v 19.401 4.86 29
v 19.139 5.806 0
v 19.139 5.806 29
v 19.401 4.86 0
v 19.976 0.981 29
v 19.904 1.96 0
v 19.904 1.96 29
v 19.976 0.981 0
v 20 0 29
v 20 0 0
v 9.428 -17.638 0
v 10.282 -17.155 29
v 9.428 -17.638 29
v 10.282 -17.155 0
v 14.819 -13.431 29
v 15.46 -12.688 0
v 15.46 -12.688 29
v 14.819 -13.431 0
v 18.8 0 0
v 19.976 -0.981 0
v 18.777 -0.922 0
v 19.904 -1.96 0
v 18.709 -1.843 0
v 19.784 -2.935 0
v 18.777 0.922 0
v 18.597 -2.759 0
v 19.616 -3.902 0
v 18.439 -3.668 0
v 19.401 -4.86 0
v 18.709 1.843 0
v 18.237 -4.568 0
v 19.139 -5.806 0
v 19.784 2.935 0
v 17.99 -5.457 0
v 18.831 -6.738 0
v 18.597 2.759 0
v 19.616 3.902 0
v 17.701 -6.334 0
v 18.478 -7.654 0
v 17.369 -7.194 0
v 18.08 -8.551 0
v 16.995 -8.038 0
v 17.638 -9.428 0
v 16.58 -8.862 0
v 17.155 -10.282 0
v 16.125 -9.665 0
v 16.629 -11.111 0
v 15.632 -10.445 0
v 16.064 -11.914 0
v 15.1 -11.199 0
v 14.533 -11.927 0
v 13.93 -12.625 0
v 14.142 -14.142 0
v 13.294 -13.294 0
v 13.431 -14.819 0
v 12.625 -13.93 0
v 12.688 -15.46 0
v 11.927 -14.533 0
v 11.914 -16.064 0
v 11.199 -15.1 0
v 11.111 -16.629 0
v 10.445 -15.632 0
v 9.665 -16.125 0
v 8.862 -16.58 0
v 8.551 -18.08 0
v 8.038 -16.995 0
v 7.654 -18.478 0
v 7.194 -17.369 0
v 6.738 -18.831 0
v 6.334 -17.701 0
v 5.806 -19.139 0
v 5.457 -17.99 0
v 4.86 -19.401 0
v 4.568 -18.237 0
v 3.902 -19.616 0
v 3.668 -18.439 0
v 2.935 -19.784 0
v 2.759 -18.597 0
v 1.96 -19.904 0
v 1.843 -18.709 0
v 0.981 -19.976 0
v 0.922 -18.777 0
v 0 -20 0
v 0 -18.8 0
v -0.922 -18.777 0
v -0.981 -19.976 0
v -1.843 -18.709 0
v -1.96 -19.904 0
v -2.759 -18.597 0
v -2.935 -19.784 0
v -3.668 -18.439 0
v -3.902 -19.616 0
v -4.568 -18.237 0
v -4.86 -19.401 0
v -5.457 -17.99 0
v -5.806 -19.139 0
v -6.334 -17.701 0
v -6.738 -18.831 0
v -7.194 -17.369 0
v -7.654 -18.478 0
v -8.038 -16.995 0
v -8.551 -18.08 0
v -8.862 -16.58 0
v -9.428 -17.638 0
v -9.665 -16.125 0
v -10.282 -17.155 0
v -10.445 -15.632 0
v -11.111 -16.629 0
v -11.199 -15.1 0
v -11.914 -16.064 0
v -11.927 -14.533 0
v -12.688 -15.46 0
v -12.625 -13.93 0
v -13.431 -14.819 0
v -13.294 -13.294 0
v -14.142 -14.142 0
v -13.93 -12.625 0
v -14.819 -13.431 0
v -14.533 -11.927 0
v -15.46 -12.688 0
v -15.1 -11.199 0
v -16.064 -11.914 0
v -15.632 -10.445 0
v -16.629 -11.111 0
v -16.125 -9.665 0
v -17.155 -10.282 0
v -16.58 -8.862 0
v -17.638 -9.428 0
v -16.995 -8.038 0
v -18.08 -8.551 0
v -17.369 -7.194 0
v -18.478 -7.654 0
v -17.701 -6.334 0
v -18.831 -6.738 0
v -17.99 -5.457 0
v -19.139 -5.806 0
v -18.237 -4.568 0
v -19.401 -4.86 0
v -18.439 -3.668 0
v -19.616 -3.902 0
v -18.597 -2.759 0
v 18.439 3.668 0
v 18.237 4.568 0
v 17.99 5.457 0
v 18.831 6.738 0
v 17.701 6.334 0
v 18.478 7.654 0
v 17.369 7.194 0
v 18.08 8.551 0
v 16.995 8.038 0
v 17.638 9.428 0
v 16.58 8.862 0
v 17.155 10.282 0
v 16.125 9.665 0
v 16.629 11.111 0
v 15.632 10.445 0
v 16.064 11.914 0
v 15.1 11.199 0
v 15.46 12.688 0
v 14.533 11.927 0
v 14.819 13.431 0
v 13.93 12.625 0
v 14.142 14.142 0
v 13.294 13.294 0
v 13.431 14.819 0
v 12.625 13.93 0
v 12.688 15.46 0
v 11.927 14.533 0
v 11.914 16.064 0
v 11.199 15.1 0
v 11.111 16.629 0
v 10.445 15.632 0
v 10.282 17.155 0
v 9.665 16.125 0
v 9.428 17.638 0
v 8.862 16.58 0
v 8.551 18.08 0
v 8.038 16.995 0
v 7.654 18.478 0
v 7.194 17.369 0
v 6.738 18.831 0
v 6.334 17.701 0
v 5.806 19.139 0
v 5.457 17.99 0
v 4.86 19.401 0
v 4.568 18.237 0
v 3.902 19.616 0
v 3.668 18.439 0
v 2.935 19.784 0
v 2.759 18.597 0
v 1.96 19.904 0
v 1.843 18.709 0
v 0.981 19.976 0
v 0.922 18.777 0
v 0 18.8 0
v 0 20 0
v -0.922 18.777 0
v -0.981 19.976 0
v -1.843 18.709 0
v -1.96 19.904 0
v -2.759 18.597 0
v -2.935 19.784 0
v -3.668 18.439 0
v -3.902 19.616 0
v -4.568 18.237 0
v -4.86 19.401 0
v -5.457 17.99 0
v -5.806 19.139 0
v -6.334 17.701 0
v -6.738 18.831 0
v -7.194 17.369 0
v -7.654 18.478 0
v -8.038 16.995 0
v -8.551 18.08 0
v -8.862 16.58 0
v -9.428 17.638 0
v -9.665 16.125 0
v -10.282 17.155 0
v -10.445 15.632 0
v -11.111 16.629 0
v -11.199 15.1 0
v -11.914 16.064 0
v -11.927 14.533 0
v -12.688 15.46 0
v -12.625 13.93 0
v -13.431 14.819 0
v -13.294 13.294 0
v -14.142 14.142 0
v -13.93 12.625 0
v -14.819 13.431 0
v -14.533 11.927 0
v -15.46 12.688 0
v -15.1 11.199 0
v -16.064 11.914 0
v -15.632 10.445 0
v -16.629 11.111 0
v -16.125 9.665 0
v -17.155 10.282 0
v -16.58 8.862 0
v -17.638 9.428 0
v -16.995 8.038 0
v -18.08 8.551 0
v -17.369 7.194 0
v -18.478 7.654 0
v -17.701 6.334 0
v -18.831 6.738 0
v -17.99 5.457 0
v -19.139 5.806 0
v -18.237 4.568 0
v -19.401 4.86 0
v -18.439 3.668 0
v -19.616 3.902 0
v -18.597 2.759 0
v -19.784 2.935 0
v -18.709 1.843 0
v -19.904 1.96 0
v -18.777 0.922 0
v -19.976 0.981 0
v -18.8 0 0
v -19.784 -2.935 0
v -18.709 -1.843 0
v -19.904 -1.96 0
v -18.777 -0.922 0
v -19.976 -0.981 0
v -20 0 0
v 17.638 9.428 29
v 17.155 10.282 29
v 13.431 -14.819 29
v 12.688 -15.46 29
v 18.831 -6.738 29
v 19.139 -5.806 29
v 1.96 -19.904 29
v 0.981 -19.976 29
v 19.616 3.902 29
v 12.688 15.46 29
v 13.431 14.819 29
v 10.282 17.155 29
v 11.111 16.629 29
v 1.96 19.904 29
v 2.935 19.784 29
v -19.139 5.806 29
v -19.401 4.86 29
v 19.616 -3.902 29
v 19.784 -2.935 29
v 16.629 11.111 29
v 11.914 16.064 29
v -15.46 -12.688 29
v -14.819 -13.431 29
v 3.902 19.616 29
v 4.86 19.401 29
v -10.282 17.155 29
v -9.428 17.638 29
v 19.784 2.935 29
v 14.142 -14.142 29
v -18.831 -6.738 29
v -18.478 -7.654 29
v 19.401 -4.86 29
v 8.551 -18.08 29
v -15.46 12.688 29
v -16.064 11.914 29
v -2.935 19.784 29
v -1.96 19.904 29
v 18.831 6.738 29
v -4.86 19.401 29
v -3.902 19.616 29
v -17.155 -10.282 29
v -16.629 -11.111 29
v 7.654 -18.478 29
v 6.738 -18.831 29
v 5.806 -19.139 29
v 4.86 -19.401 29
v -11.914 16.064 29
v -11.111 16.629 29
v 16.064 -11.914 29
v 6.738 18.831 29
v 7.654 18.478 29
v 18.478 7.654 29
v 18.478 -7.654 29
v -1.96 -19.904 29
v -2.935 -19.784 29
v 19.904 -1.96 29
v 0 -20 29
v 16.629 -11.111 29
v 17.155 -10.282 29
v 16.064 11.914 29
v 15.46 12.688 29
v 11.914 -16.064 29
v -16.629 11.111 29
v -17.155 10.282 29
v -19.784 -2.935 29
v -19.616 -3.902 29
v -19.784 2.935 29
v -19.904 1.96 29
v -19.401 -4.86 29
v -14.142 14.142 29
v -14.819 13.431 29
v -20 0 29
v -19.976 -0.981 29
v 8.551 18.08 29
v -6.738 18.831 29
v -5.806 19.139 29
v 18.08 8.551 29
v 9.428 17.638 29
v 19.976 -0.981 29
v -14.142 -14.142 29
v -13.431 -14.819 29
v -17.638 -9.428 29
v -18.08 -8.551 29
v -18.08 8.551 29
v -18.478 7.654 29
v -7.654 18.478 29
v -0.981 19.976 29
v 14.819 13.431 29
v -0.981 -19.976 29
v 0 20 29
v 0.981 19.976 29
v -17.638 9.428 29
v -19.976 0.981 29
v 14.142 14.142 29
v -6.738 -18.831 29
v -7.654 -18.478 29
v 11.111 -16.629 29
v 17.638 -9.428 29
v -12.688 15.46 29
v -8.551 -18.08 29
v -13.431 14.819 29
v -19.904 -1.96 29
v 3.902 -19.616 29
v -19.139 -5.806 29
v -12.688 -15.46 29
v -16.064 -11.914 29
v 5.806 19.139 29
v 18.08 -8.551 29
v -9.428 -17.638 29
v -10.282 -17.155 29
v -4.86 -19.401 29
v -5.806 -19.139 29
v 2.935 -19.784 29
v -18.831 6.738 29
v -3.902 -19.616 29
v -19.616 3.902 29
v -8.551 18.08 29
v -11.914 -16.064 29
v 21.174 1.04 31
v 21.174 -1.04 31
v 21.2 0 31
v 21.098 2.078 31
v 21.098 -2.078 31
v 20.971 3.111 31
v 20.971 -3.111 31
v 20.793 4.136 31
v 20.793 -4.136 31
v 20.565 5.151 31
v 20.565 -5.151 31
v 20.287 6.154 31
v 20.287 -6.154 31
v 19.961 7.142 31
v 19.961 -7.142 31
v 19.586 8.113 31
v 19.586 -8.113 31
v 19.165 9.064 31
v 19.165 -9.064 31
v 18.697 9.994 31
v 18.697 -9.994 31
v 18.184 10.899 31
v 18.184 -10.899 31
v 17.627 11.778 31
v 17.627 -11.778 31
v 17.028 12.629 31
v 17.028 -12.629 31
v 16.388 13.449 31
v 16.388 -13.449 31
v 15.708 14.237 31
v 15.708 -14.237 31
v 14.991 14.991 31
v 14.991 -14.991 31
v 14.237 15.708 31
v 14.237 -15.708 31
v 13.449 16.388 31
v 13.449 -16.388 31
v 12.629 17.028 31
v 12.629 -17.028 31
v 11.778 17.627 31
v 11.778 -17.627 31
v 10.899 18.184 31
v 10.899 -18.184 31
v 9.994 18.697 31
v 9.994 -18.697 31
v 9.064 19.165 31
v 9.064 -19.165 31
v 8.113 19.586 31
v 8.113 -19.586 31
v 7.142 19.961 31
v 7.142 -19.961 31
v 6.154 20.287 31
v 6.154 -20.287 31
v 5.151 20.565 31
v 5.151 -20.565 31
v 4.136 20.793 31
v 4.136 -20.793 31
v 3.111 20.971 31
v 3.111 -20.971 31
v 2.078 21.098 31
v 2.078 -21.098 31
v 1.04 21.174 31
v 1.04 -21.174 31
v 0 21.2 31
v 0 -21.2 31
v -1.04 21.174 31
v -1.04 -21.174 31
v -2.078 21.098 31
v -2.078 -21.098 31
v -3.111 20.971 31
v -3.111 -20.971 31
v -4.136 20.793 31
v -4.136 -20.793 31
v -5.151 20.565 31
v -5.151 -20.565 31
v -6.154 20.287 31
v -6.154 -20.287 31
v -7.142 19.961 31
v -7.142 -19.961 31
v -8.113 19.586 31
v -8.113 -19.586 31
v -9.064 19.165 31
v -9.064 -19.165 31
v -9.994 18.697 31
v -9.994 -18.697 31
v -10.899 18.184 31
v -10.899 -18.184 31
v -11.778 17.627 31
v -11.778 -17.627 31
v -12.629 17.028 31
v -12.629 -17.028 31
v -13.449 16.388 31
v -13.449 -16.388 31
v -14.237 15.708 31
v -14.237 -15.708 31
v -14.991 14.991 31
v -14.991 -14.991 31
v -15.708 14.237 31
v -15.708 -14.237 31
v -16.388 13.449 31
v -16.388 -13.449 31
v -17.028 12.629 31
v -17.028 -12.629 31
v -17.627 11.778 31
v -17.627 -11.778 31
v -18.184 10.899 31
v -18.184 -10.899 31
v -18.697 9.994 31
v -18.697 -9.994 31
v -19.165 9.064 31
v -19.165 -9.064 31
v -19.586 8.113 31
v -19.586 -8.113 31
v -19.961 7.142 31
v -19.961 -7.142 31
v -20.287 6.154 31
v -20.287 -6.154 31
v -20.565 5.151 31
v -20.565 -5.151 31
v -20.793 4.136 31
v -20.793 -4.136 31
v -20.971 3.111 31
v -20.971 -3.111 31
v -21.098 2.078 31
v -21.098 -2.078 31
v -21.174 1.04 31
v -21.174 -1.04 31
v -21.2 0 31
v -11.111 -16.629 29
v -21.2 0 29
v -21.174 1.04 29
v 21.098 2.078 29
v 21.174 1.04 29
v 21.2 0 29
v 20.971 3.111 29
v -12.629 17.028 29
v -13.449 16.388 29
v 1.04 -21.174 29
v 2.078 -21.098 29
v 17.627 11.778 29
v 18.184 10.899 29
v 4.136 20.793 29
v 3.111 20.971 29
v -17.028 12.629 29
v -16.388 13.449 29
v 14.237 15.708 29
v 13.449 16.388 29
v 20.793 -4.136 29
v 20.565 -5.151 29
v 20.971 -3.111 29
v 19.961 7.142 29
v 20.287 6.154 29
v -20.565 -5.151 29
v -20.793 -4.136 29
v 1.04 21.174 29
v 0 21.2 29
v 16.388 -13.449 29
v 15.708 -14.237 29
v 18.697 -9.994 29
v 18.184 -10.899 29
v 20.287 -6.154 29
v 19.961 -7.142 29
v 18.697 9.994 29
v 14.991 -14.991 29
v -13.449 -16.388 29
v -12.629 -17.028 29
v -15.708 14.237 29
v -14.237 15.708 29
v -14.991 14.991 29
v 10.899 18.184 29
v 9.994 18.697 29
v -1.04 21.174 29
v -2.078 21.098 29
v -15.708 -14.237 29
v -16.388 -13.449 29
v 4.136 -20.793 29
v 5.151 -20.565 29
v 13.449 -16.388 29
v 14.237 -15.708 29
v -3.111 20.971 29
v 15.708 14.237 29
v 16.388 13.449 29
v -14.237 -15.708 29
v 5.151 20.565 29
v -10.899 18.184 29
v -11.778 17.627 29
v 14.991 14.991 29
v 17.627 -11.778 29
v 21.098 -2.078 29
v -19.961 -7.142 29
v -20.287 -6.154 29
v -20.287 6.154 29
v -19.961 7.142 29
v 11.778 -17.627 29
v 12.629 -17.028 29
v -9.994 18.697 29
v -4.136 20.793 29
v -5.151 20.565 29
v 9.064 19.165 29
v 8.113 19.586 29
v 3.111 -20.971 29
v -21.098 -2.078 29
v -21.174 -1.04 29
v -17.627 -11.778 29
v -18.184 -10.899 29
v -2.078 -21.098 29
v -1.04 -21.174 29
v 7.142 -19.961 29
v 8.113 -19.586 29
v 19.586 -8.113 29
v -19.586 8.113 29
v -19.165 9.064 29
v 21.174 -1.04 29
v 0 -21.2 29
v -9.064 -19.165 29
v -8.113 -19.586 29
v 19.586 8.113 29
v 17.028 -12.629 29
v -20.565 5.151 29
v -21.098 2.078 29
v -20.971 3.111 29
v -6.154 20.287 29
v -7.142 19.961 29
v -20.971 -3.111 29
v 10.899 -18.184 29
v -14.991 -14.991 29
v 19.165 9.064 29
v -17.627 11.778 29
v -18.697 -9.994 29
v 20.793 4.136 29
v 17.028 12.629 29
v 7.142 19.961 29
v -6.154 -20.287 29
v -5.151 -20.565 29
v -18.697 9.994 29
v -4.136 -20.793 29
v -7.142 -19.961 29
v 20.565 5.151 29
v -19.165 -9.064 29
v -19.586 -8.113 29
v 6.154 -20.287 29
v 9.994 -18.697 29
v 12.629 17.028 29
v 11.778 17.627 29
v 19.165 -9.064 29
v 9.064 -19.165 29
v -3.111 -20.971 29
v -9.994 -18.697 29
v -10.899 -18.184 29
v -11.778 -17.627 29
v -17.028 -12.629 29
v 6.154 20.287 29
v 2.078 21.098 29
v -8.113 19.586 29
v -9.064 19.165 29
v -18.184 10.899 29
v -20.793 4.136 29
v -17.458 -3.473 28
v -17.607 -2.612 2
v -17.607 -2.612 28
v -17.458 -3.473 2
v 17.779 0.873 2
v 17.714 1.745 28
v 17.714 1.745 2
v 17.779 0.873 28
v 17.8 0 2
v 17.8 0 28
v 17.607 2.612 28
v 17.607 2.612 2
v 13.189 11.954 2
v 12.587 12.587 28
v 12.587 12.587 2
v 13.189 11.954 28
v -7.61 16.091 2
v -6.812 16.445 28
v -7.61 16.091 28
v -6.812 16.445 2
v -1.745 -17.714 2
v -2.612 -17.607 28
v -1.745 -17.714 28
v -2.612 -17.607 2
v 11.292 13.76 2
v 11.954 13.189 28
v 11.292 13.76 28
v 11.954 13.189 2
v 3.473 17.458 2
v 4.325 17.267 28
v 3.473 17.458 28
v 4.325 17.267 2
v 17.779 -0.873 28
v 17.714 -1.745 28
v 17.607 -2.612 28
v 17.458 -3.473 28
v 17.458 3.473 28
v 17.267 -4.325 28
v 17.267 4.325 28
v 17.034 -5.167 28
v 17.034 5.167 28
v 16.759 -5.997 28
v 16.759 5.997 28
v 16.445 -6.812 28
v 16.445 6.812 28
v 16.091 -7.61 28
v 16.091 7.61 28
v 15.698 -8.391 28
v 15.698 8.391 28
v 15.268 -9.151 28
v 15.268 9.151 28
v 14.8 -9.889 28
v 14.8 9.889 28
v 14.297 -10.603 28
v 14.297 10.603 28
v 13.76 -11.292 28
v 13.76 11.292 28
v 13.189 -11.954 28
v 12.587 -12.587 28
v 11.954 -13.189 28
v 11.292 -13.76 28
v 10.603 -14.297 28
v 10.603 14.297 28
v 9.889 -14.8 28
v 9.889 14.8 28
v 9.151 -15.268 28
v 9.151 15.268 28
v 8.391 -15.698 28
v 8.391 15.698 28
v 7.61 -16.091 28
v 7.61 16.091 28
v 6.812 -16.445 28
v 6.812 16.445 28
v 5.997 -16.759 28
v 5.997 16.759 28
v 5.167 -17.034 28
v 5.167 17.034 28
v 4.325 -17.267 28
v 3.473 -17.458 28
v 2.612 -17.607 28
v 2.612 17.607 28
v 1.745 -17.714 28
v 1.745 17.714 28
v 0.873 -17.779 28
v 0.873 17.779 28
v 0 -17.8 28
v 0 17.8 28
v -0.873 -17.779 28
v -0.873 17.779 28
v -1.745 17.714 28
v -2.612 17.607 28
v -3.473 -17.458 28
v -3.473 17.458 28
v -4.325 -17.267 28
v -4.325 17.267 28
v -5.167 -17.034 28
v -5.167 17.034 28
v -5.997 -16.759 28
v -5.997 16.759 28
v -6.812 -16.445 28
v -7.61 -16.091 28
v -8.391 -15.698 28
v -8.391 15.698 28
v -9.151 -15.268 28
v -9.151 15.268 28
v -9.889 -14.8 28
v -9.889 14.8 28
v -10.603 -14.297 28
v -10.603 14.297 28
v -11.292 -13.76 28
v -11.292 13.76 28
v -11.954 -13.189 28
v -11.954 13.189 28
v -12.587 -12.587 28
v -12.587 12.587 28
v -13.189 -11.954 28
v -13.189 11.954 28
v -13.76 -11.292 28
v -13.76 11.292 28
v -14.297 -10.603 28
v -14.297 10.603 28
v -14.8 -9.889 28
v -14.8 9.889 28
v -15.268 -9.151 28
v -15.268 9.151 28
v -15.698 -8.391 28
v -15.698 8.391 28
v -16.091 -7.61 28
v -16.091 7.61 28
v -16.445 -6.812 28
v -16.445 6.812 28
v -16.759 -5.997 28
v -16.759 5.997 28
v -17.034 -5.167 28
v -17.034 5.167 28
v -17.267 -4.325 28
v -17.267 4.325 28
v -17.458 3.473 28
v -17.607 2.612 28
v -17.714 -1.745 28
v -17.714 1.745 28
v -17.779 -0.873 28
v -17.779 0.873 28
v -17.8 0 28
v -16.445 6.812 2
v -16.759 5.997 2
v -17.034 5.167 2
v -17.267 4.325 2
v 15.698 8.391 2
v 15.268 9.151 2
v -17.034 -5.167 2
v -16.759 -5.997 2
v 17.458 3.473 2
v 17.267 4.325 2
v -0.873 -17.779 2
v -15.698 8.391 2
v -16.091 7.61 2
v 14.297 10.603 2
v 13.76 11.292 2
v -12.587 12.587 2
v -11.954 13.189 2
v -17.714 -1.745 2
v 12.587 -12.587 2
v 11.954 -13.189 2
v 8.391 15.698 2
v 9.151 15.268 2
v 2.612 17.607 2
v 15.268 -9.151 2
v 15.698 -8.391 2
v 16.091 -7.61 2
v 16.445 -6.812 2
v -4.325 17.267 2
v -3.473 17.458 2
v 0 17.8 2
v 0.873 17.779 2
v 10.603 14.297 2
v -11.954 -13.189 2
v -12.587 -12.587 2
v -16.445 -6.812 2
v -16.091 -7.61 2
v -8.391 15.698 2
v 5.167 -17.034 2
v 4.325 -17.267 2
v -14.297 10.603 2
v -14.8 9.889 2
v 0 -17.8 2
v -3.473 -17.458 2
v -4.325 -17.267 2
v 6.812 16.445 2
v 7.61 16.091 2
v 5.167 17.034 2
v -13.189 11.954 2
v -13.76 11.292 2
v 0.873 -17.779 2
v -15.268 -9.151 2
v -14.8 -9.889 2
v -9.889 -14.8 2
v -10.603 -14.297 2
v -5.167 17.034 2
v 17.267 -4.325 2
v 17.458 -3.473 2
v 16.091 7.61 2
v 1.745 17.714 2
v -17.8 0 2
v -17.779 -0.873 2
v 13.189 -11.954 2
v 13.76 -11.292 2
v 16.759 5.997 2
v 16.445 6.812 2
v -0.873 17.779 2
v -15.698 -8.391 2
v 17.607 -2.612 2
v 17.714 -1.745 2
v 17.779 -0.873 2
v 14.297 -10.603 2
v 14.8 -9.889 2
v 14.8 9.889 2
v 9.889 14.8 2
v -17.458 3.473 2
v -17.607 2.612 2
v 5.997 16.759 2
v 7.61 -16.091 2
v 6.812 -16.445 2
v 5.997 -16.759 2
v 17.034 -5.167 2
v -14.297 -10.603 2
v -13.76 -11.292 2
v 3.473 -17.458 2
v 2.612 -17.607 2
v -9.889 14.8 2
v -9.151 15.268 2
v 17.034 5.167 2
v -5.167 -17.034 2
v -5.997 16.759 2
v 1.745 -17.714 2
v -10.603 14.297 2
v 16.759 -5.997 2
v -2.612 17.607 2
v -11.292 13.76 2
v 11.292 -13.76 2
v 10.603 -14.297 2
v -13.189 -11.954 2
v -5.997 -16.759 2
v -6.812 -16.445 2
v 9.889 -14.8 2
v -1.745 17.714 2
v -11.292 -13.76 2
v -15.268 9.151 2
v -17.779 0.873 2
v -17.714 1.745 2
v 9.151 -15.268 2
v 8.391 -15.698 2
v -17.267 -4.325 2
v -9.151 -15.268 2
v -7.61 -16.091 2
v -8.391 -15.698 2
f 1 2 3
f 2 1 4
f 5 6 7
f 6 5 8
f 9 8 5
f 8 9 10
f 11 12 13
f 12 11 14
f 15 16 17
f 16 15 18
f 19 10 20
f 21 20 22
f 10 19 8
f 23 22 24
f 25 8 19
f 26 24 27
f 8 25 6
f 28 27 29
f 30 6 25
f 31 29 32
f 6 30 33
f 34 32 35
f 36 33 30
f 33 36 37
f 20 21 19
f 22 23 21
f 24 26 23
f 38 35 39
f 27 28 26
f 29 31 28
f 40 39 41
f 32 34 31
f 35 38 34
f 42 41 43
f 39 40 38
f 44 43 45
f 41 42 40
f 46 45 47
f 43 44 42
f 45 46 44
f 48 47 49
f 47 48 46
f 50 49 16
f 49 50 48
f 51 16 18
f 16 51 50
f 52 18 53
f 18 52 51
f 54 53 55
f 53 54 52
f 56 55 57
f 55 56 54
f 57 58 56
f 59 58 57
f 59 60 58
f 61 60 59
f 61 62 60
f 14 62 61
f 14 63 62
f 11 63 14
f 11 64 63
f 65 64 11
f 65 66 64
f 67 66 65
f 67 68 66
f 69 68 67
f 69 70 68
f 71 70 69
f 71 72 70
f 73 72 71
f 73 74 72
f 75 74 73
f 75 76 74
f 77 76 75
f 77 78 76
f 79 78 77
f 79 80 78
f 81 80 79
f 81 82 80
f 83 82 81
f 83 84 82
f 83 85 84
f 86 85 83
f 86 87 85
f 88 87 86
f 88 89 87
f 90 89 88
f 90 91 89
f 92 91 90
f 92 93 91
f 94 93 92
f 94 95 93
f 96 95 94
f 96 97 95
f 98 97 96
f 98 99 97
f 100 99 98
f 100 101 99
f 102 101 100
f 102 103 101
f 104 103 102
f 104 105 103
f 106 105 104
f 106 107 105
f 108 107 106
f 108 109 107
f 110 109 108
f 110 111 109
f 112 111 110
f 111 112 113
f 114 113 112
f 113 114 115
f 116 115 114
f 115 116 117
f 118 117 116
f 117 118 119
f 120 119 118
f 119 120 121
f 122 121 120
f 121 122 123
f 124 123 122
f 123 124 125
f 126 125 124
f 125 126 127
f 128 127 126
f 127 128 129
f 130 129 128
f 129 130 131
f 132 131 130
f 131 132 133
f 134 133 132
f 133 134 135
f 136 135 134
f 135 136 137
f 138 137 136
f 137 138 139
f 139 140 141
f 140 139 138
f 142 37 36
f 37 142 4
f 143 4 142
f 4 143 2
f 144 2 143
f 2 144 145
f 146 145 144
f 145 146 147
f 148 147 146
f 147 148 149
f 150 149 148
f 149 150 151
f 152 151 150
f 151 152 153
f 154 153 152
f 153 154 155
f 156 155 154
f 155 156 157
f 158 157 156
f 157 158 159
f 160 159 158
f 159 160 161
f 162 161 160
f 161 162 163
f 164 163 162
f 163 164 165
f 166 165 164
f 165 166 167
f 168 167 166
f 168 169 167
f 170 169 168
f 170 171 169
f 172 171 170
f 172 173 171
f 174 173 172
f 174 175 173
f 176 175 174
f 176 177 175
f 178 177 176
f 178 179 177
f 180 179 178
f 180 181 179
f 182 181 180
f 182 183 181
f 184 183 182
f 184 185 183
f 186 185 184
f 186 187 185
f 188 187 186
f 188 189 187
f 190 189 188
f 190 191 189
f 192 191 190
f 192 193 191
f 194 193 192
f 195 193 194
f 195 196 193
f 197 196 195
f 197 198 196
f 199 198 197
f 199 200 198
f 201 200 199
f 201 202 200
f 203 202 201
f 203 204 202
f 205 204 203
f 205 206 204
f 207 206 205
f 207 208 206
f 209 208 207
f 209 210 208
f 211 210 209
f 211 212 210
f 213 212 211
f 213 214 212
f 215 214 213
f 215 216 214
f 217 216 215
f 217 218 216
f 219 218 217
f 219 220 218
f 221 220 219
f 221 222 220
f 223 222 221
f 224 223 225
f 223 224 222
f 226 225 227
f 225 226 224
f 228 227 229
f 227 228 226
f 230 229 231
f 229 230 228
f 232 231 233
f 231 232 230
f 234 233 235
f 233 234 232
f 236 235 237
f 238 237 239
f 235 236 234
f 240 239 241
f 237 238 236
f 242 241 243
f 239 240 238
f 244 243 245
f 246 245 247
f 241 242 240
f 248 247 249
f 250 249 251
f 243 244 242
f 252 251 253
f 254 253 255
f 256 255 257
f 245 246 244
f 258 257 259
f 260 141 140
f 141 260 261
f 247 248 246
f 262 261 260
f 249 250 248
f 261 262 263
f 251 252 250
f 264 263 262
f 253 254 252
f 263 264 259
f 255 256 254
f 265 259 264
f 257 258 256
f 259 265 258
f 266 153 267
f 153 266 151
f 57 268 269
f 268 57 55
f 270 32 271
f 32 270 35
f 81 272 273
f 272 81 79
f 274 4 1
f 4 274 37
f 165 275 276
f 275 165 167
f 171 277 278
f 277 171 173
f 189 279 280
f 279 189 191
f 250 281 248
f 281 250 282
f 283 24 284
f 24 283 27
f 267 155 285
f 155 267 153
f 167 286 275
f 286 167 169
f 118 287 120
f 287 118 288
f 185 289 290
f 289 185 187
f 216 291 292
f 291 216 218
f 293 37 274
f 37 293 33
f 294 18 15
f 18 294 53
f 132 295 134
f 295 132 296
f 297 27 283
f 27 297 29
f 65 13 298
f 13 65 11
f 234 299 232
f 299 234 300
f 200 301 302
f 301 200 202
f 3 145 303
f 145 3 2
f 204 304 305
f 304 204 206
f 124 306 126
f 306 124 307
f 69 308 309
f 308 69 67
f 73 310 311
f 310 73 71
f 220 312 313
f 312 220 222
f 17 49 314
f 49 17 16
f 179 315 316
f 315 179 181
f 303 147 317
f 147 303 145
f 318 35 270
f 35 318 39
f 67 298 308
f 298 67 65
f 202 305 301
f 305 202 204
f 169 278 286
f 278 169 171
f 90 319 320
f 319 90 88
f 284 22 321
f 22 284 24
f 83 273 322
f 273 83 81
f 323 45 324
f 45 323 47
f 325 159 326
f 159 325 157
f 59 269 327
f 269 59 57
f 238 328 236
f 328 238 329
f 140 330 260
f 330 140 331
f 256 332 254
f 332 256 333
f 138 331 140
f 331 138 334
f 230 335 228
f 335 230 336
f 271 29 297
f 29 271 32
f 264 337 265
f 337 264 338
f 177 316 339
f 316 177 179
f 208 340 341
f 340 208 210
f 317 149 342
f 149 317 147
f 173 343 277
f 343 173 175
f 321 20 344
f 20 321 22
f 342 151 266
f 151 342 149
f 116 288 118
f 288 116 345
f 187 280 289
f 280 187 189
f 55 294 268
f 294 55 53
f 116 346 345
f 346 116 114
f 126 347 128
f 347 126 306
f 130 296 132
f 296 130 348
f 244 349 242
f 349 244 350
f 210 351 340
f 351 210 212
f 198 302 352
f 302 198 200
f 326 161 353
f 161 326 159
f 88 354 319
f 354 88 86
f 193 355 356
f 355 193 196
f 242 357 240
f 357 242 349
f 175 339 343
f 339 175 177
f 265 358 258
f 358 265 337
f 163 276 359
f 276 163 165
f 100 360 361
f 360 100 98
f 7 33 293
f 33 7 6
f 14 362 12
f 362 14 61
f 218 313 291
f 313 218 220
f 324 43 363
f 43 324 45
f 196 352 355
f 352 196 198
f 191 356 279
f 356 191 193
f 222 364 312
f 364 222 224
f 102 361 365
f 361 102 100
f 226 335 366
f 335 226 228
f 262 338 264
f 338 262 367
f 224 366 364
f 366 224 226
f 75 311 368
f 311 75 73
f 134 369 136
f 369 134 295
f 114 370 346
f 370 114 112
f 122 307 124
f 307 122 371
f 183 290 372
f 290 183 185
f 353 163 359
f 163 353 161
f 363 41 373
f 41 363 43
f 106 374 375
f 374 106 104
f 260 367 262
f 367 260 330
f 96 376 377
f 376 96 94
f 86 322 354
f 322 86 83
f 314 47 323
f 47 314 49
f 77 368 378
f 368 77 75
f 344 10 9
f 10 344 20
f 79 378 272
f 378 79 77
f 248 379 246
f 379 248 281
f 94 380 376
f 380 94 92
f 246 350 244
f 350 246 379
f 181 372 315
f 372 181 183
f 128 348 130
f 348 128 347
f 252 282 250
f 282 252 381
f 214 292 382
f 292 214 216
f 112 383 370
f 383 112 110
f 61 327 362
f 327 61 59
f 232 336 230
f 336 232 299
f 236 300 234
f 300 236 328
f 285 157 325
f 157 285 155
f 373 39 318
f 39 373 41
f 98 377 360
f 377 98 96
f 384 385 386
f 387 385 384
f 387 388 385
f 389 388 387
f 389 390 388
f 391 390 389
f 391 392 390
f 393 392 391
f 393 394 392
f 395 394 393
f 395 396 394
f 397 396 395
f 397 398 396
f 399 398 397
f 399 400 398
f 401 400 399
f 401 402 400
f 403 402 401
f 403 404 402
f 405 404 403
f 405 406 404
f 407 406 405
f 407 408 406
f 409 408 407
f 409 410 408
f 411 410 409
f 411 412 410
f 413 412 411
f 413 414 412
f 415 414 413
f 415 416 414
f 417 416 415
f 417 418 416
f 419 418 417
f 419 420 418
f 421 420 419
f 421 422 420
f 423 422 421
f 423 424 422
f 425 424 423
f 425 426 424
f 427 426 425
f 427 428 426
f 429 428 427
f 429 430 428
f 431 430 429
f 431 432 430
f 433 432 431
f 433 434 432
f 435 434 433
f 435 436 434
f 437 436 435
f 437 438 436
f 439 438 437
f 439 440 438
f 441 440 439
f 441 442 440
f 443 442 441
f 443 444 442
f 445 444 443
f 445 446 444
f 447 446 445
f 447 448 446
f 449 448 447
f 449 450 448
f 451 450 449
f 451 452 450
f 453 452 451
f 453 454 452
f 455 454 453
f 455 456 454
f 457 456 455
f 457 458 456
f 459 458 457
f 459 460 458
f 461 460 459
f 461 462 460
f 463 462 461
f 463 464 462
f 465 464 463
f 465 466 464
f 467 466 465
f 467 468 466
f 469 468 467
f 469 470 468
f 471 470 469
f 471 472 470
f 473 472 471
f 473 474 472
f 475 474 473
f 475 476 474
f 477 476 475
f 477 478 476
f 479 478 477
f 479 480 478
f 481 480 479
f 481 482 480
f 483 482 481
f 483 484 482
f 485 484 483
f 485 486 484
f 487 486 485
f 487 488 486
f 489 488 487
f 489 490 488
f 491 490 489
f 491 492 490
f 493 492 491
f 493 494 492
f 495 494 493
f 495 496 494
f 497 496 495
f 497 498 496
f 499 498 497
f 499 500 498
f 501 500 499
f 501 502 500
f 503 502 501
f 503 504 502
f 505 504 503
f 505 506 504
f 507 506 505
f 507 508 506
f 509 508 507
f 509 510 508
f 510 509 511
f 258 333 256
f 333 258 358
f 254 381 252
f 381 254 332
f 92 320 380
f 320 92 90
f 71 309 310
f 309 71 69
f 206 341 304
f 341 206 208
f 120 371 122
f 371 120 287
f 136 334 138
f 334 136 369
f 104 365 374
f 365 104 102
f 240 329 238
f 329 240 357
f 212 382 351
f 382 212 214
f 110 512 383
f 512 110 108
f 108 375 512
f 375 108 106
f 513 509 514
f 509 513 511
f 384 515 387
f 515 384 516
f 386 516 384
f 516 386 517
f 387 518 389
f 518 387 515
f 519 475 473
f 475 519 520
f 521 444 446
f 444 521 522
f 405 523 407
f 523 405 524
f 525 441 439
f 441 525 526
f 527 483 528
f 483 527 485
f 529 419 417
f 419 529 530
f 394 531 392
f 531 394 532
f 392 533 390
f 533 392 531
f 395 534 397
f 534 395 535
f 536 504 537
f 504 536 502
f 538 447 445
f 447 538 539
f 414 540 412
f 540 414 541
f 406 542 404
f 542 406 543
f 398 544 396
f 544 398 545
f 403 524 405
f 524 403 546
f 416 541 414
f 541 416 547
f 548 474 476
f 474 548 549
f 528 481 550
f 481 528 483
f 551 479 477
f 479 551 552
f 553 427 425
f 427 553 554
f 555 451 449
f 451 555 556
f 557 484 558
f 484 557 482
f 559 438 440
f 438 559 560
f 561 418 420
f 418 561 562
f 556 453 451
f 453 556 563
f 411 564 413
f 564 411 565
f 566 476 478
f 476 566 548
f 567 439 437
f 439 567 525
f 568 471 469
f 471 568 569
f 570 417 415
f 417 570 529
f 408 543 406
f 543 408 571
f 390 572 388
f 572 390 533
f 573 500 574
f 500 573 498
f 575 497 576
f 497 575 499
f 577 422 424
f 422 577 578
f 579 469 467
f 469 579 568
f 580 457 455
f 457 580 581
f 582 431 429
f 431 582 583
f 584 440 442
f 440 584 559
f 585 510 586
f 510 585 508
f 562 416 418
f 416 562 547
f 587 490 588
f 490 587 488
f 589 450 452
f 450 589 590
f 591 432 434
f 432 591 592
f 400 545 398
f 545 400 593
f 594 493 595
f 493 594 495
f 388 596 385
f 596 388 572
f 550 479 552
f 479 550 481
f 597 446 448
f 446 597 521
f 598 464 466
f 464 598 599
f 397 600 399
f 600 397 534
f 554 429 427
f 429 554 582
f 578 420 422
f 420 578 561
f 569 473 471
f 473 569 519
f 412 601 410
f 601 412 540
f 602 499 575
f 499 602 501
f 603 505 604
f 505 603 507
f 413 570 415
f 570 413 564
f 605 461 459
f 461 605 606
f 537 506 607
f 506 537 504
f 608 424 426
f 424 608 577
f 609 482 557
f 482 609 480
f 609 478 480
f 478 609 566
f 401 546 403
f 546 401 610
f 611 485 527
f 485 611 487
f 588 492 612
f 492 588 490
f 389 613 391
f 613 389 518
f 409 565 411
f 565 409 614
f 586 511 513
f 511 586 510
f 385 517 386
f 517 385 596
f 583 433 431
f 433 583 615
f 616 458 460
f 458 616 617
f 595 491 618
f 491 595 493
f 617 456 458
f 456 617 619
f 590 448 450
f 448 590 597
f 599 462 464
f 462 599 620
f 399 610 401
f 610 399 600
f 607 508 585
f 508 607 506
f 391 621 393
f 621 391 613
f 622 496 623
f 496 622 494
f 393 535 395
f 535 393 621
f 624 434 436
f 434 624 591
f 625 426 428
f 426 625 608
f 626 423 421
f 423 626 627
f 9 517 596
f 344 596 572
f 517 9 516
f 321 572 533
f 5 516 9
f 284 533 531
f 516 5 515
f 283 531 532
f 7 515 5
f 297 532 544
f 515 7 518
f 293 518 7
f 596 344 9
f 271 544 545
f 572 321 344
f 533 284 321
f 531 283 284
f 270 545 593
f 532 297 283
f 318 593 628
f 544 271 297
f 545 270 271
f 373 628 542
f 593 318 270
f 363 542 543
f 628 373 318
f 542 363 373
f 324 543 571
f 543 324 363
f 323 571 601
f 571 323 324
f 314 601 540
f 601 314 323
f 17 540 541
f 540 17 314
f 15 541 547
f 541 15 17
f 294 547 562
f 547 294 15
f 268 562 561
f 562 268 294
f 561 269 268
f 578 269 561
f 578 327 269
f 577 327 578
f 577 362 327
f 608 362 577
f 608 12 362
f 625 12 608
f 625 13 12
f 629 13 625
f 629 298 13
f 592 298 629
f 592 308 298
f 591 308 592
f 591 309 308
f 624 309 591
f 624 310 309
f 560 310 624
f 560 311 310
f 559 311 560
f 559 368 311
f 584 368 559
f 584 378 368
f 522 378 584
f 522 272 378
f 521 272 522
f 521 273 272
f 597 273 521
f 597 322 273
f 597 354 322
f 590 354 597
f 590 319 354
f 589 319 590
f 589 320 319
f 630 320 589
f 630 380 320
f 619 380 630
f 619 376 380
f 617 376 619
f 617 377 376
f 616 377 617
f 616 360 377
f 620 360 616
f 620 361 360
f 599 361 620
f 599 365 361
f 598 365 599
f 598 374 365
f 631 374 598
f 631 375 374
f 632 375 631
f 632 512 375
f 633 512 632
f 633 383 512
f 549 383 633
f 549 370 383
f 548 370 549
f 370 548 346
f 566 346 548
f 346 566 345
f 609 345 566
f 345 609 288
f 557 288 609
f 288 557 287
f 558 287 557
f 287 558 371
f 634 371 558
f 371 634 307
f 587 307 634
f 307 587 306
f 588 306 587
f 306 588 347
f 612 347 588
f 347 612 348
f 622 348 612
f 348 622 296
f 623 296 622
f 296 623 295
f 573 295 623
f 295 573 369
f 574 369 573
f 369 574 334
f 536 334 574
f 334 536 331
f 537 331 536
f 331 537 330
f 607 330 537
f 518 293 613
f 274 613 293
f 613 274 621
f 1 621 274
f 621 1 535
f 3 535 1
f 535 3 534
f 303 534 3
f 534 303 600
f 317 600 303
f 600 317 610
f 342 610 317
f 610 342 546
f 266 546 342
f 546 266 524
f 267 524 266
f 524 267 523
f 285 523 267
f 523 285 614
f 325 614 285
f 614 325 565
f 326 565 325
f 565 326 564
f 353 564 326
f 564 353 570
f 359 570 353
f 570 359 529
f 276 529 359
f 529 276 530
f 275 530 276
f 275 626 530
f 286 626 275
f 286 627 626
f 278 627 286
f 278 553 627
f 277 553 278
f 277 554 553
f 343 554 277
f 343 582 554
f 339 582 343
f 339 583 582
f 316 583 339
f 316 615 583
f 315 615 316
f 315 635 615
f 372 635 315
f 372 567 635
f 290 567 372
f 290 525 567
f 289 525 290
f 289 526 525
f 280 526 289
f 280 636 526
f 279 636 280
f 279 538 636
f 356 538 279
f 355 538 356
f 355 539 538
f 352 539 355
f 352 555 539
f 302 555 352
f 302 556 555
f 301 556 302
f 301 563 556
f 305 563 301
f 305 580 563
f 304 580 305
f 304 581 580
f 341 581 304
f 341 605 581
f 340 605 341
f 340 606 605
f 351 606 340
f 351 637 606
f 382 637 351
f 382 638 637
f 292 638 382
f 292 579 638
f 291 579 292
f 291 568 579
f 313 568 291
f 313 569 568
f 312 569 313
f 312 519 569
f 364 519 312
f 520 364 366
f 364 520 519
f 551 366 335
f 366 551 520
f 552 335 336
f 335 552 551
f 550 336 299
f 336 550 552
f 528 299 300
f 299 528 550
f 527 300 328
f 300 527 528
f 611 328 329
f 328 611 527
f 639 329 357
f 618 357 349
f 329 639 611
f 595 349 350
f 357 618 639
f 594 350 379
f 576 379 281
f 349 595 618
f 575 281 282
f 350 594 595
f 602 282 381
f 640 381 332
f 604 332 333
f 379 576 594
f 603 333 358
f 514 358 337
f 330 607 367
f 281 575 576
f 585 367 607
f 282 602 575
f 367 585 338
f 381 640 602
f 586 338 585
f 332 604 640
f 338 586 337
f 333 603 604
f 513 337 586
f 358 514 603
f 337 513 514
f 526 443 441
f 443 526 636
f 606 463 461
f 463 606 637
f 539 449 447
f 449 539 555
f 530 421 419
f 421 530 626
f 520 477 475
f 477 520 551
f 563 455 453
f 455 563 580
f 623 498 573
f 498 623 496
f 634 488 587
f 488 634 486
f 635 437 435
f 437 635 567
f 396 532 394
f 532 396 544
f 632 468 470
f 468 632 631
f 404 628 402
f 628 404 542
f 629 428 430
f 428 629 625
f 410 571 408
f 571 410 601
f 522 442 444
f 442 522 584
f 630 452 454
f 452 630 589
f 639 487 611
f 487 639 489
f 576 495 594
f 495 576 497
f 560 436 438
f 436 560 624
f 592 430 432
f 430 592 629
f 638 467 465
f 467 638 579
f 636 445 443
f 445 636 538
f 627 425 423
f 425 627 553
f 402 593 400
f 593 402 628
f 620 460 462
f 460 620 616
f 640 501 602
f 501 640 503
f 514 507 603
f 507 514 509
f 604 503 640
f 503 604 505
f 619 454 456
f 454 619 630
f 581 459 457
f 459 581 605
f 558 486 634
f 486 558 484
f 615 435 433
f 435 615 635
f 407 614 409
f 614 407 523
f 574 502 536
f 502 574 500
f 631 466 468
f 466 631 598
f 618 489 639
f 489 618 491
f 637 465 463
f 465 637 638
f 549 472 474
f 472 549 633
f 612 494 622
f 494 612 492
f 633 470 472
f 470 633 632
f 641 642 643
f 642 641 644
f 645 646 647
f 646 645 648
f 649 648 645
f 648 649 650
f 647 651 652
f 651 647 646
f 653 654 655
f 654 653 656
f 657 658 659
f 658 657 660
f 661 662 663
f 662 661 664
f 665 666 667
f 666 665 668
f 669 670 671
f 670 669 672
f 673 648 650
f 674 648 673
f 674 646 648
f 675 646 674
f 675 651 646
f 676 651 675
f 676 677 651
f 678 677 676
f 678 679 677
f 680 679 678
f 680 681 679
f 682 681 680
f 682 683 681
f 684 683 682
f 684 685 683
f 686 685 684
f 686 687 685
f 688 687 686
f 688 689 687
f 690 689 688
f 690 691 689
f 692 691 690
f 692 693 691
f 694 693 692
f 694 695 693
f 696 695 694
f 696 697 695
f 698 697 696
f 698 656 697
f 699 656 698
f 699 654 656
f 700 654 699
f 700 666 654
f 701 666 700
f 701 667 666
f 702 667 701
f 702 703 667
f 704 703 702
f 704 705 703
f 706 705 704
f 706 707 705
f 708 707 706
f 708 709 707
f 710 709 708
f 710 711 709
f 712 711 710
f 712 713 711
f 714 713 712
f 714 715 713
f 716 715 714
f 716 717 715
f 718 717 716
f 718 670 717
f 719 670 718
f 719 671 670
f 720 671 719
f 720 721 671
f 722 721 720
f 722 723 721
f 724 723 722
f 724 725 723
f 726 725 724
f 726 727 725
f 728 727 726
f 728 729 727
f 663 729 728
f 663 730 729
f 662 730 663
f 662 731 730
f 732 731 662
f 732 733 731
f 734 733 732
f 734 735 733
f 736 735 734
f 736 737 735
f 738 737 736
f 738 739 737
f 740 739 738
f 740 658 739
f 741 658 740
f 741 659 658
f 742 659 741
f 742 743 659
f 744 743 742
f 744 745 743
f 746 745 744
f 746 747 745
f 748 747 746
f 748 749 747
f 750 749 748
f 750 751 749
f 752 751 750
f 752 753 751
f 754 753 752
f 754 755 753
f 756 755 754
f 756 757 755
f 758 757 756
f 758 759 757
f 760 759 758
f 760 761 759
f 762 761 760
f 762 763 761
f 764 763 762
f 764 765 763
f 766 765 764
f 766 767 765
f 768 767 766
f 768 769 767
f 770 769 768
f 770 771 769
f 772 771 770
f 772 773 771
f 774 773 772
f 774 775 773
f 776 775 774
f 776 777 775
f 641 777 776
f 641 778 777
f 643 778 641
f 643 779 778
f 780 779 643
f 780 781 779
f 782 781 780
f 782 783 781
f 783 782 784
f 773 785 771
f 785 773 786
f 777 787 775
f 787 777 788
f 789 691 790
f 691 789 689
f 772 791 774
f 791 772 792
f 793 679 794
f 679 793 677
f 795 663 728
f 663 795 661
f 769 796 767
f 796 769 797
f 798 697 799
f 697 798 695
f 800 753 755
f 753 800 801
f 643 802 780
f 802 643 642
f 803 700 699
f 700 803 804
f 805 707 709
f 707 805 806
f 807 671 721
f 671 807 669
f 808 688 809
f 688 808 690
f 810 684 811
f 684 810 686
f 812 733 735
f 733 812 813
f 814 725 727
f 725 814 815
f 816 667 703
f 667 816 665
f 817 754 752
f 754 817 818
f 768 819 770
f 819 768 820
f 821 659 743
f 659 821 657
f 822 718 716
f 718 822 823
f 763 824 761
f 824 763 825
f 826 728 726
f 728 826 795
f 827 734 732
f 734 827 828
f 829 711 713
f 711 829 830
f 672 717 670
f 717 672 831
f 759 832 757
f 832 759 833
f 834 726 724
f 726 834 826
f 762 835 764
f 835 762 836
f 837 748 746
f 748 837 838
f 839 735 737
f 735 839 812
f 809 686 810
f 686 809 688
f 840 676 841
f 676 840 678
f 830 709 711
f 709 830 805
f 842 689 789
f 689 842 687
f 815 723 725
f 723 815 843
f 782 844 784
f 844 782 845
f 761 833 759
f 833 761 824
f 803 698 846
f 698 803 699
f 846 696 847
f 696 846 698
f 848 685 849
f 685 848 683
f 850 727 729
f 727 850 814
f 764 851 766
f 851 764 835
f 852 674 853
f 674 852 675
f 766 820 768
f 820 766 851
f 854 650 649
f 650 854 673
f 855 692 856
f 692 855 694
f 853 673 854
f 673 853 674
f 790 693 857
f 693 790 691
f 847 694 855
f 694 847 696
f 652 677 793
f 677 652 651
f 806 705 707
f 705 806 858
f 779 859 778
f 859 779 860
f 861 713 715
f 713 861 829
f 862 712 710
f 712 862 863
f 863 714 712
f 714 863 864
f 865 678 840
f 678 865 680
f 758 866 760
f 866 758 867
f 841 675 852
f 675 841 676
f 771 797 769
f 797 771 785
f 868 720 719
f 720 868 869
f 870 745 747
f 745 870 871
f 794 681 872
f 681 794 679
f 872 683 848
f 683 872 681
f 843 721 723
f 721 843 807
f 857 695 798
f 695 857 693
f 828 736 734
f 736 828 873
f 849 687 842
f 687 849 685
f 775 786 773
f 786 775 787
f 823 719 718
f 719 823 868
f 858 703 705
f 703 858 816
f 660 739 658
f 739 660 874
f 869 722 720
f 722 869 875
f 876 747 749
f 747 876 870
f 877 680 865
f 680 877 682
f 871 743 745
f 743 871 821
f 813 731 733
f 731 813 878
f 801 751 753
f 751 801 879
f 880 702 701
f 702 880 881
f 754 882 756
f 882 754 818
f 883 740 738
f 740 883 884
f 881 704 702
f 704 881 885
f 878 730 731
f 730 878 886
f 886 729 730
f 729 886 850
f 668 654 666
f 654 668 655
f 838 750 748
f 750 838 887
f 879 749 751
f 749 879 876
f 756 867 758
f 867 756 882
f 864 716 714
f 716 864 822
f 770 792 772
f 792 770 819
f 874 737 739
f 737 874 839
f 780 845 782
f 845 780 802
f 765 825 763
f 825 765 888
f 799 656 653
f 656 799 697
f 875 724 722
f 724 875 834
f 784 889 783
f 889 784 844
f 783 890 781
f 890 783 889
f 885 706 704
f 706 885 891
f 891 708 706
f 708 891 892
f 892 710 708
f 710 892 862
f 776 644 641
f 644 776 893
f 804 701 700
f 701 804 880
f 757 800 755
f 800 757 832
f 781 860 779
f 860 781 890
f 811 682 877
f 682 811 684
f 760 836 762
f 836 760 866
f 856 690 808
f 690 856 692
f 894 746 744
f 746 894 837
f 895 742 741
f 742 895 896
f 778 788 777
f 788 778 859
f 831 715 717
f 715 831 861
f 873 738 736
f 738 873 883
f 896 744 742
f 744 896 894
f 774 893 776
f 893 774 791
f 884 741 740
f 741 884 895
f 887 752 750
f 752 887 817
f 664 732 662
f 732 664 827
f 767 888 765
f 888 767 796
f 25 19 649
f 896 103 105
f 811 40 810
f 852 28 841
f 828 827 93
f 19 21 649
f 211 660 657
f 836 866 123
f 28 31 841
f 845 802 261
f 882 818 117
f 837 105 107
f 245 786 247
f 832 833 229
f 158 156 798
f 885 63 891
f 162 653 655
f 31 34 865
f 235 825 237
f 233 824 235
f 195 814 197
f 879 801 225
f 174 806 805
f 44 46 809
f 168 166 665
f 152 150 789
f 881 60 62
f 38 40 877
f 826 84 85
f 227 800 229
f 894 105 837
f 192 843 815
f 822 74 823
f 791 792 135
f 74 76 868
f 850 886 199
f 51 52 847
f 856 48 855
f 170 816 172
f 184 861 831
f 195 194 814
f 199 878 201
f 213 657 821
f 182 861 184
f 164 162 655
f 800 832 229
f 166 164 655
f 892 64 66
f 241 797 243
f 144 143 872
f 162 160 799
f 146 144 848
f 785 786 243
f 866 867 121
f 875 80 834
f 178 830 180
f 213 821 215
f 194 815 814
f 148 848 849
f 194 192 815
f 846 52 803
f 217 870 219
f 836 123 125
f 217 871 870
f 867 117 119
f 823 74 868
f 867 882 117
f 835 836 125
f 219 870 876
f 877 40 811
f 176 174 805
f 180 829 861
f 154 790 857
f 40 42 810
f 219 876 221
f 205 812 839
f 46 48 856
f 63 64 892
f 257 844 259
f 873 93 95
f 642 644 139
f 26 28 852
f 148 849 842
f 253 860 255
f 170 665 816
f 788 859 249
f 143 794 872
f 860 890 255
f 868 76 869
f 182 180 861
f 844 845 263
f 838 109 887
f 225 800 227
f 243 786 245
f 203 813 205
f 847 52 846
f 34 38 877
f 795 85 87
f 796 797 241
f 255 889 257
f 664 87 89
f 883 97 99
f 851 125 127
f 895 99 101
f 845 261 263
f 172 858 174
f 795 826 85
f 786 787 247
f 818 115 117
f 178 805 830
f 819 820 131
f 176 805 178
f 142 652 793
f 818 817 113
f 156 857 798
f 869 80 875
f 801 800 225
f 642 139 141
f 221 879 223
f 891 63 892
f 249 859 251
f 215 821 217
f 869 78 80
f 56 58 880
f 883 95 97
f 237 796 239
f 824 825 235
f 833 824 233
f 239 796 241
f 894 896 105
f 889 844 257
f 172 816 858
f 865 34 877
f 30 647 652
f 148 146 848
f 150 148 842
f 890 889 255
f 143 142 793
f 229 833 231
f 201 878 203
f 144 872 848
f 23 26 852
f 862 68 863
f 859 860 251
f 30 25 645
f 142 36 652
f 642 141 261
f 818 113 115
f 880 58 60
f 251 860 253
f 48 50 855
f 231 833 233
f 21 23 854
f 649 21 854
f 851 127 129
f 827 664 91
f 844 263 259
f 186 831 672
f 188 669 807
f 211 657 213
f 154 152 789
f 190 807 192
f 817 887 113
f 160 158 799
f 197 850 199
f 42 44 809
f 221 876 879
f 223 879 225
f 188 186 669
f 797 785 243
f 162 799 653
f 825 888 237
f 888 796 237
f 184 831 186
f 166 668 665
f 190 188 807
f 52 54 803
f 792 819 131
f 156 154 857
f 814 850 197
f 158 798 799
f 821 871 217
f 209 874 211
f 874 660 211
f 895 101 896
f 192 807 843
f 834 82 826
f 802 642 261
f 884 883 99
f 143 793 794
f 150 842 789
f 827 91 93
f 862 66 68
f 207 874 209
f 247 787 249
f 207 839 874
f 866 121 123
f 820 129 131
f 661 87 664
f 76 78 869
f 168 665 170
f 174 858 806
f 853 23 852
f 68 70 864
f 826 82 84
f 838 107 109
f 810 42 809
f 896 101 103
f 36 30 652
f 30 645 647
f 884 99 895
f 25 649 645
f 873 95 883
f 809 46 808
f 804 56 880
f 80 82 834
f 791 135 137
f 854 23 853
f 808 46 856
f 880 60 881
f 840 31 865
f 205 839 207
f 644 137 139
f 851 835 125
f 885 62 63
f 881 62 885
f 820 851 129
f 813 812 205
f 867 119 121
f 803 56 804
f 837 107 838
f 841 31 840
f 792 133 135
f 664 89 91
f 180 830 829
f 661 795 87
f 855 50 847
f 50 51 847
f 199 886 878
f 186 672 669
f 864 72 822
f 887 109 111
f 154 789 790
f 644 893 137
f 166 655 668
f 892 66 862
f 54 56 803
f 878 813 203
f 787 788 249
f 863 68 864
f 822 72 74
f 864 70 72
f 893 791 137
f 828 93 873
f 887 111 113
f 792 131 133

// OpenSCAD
$fn=128;

// HT 32 cap (approximation)
// Typical HT 32 OD ~ 40 mm. Cap with socket and closed end.

od = 40;            // outer diameter of cap
wall = 2.2;         // wall thickness
id = od - 2*wall;   // inner diameter
socket_depth = 28;  // insertion depth
end_thickness = 3;  // closed end thickness
lip = 2.0;          // small outer lip height
lip_over = 1.2;     // lip radial overhang

module ht32_cap() {
    difference() {
        union() {
            // main outer body
            cylinder(h=socket_depth + end_thickness, d=od);

            // small outer lip at opening
            translate([0,0,socket_depth + end_thickness - lip])
                cylinder(h=lip, d=od + 2*lip_over);
        }

        // inner cavity (open at bottom, closed at top by end_thickness)
        translate([0,0,0])
            cylinder(h=socket_depth, d=id);

        // slight lead-in chamfer at opening (inside)
        translate([0,0,0])
            cylinder(h=2.0, d1=id+2.0, d2=id);
    }
}

ht32_cap();
